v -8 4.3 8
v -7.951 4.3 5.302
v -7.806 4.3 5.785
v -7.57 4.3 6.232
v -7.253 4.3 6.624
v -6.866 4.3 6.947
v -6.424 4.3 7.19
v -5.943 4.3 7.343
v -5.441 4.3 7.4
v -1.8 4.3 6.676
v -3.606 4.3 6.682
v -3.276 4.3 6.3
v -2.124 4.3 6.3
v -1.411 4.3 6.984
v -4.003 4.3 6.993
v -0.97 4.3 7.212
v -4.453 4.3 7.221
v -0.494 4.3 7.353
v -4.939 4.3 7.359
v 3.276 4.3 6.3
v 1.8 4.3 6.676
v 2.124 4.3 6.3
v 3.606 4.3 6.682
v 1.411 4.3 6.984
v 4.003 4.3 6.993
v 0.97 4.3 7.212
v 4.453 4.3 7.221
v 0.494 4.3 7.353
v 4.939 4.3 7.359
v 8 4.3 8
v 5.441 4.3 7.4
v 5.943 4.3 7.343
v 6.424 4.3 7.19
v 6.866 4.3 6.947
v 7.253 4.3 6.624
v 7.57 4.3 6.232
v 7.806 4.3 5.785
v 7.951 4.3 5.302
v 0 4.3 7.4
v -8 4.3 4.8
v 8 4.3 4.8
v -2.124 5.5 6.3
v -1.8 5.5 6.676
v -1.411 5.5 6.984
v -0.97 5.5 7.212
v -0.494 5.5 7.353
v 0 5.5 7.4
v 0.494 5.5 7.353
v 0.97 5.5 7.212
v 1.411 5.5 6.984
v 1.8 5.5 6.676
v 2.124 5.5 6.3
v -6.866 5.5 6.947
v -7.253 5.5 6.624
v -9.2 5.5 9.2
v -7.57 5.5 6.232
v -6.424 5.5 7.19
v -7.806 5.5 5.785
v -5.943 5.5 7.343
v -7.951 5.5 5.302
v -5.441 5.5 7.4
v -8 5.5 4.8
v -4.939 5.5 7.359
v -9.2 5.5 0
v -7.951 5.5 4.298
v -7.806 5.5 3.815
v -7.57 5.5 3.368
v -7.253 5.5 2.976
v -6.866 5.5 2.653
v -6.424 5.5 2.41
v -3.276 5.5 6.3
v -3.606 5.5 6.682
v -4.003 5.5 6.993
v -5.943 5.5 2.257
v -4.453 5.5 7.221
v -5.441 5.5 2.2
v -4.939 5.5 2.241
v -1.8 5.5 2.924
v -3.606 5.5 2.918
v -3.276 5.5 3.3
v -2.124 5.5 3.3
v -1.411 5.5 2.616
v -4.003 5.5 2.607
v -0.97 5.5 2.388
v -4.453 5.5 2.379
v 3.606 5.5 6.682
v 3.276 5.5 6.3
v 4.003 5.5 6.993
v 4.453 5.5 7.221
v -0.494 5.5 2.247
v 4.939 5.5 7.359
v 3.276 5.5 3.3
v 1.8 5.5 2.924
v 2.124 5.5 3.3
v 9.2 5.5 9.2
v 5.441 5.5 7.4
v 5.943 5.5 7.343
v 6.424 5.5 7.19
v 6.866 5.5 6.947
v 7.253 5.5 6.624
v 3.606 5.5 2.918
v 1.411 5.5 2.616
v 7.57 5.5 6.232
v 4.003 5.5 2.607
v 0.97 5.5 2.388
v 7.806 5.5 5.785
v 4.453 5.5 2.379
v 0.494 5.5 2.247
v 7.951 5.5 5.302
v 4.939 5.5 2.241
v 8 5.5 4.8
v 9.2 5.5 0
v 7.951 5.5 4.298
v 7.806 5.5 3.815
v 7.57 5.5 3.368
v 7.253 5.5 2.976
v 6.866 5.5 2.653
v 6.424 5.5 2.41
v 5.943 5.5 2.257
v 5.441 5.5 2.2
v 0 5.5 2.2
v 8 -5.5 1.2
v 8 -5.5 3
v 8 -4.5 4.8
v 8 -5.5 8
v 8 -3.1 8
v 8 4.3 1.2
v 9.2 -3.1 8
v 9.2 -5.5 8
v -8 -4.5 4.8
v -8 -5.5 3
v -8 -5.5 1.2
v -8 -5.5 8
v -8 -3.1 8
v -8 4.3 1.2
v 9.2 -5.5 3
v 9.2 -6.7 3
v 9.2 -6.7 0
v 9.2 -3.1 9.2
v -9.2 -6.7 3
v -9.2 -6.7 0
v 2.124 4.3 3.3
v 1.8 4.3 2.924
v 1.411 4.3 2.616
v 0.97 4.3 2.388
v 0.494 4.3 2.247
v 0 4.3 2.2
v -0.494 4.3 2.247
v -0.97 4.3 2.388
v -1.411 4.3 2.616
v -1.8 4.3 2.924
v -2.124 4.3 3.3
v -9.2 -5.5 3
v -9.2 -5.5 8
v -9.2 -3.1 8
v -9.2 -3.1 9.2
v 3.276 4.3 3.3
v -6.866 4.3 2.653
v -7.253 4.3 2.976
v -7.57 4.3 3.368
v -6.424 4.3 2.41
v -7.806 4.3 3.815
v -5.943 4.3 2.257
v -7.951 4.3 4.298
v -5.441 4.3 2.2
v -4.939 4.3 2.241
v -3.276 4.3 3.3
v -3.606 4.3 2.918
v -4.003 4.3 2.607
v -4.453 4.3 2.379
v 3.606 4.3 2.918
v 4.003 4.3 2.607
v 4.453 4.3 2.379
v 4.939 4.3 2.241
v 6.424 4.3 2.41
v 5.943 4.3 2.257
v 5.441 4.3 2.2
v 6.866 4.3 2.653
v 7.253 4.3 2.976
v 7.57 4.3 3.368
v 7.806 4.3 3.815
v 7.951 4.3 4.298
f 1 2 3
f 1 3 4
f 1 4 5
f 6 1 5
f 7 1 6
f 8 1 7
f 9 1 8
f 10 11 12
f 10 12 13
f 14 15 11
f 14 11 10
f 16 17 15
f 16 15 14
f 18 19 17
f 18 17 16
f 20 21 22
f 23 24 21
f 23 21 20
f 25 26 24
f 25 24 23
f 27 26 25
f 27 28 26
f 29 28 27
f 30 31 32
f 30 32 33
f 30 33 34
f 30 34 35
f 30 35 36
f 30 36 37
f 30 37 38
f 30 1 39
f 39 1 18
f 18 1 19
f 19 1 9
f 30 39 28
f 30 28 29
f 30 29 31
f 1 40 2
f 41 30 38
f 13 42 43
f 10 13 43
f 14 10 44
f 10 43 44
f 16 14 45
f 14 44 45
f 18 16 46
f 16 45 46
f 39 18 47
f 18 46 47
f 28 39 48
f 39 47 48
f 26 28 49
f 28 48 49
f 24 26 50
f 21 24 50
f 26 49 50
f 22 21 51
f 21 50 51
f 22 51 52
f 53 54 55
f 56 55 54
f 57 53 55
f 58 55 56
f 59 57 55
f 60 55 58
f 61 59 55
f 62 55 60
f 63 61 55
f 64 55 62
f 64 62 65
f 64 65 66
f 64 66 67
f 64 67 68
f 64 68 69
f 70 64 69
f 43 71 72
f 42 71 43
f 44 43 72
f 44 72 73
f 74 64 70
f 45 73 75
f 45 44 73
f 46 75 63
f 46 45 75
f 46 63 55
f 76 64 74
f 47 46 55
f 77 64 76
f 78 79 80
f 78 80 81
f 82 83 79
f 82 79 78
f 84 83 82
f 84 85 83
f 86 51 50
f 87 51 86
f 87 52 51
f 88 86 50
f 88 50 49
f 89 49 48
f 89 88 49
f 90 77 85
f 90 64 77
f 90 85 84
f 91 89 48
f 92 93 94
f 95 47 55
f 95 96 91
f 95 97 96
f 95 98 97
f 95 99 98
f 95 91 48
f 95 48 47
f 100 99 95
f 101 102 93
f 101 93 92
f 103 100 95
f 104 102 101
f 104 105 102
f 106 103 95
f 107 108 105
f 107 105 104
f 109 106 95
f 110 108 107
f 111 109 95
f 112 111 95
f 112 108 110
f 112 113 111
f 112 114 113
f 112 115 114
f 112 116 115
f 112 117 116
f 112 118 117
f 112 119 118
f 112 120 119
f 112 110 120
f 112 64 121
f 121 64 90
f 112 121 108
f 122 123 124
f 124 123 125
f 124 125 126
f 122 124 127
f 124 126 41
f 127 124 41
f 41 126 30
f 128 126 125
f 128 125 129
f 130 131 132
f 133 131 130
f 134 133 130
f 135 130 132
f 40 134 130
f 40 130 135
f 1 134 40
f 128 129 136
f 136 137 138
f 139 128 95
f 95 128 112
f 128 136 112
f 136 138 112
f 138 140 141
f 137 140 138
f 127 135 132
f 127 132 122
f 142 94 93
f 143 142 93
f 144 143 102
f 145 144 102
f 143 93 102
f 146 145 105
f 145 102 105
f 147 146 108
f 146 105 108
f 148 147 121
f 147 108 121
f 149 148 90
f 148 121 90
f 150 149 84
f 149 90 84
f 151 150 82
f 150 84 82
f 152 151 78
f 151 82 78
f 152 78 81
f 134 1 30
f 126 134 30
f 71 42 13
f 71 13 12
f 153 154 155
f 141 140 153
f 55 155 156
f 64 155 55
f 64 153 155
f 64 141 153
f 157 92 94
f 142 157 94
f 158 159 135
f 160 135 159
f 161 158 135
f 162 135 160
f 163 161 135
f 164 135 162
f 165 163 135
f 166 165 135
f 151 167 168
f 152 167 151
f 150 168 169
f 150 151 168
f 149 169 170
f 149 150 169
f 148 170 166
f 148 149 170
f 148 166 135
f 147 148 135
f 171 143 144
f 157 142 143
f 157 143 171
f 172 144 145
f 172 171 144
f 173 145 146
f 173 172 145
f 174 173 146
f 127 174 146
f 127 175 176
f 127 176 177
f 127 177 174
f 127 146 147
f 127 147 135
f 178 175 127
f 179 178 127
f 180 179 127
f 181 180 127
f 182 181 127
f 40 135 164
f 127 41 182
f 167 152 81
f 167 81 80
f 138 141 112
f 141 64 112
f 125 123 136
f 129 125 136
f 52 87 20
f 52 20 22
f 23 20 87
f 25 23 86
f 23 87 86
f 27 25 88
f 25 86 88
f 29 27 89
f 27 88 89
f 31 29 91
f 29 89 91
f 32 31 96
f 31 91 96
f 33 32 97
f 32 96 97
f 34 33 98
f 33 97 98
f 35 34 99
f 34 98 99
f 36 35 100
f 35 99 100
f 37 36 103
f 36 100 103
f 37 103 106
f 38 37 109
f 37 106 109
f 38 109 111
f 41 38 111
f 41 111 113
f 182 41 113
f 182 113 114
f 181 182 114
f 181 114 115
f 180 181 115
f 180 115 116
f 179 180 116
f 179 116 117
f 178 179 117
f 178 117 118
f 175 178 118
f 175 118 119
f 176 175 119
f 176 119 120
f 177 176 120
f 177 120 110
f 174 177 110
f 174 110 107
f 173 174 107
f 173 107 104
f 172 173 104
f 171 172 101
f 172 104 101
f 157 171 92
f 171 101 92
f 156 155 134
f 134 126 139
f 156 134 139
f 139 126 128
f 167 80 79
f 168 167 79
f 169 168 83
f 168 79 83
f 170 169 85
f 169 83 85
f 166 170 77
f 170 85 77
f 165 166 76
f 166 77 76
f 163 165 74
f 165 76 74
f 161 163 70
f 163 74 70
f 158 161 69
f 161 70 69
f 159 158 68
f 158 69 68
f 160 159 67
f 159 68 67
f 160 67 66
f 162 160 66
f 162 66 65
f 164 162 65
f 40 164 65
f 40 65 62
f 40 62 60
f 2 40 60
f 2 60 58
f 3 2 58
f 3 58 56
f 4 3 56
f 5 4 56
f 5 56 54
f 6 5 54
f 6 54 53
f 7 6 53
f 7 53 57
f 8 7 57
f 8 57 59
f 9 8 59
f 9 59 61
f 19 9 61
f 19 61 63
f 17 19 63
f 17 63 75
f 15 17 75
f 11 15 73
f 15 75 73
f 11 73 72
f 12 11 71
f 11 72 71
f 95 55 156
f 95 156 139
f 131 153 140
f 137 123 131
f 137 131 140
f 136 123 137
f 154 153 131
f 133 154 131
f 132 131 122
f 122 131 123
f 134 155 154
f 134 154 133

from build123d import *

# Parameters (mm, degrees)
SKETCH_W        = 18.4
SKETCH_H        = 11
PAD_DEPTH       = 8
SKETCH002_R     = 2.6
POCKET_DEPTH    = 10
SKETCH003_W     = 16
SKETCH003_H     = 9.8
POCKET001_DEPTH = 6.8
SKETCH004_W     = 10.8
SKETCH004_H     = 3
POCKET002_DEPTH = 5
SKETCH005_W     = 18.4
SKETCH005_H     = 3
PAD001_DEPTH    = 1.2
SKETCH006_W     = 18.4
SKETCH006_H     = 8.6
PAD002_DEPTH    = 1.2


with BuildPart() as part:
    # Sketch → Pad (new body)
    with BuildSketch(Plane.XY):
        Rectangle(SKETCH_W, SKETCH_H)
    extrude(amount=PAD_DEPTH)

    # Sketch002 (on Face3 of Pad) → Pocket (cut)
    with BuildSketch(Plane(origin=(0, 5.5, 0), x_dir=(-1, 0, 0), z_dir=(0, 1, 0))):
        with Locations((-5.4, 4.8)):
            Circle(SKETCH002_R)
        with Locations((0, 4.8)):
            Circle(SKETCH002_R)
        with Locations((5.4, 4.8)):
            Circle(SKETCH002_R)
    extrude(amount=-POCKET_DEPTH, mode=Mode.SUBTRACT)

    # Sketch003 (on Face5 of Pocket) → Pocket001 (cut)
    with BuildSketch(Plane.XY.offset(8)):
        with Locations((0, -0.6)):
            Rectangle(SKETCH003_W, SKETCH003_H)
    extrude(amount=-POCKET001_DEPTH, mode=Mode.SUBTRACT)

    # Sketch004 (on Face9 of Pocket001) → Pocket002 (cut)
    with BuildSketch(Plane(origin=(0, 5.5, 0), x_dir=(-1, 0, 0), z_dir=(0, 1, 0))):
        with Locations((0, 4.8)):
            Rectangle(SKETCH004_W, SKETCH004_H)
    extrude(amount=-POCKET002_DEPTH, mode=Mode.SUBTRACT)

    # Sketch005 (on Face1 of Pocket002) → Pad001 (join)
    with BuildSketch(Plane.XZ.offset(5.5)):
        with Locations((0, 1.5)):
            Rectangle(SKETCH005_W, SKETCH005_H)
    extrude(amount=PAD001_DEPTH)

    # Sketch006 (on Face4 of Pad001) → Pad002 (join)
    with BuildSketch(Plane.XY.offset(8)):
        with Locations((0, 1.2)):
            Rectangle(SKETCH006_W, SKETCH006_H)
    extrude(amount=PAD002_DEPTH)


solid = part.part
